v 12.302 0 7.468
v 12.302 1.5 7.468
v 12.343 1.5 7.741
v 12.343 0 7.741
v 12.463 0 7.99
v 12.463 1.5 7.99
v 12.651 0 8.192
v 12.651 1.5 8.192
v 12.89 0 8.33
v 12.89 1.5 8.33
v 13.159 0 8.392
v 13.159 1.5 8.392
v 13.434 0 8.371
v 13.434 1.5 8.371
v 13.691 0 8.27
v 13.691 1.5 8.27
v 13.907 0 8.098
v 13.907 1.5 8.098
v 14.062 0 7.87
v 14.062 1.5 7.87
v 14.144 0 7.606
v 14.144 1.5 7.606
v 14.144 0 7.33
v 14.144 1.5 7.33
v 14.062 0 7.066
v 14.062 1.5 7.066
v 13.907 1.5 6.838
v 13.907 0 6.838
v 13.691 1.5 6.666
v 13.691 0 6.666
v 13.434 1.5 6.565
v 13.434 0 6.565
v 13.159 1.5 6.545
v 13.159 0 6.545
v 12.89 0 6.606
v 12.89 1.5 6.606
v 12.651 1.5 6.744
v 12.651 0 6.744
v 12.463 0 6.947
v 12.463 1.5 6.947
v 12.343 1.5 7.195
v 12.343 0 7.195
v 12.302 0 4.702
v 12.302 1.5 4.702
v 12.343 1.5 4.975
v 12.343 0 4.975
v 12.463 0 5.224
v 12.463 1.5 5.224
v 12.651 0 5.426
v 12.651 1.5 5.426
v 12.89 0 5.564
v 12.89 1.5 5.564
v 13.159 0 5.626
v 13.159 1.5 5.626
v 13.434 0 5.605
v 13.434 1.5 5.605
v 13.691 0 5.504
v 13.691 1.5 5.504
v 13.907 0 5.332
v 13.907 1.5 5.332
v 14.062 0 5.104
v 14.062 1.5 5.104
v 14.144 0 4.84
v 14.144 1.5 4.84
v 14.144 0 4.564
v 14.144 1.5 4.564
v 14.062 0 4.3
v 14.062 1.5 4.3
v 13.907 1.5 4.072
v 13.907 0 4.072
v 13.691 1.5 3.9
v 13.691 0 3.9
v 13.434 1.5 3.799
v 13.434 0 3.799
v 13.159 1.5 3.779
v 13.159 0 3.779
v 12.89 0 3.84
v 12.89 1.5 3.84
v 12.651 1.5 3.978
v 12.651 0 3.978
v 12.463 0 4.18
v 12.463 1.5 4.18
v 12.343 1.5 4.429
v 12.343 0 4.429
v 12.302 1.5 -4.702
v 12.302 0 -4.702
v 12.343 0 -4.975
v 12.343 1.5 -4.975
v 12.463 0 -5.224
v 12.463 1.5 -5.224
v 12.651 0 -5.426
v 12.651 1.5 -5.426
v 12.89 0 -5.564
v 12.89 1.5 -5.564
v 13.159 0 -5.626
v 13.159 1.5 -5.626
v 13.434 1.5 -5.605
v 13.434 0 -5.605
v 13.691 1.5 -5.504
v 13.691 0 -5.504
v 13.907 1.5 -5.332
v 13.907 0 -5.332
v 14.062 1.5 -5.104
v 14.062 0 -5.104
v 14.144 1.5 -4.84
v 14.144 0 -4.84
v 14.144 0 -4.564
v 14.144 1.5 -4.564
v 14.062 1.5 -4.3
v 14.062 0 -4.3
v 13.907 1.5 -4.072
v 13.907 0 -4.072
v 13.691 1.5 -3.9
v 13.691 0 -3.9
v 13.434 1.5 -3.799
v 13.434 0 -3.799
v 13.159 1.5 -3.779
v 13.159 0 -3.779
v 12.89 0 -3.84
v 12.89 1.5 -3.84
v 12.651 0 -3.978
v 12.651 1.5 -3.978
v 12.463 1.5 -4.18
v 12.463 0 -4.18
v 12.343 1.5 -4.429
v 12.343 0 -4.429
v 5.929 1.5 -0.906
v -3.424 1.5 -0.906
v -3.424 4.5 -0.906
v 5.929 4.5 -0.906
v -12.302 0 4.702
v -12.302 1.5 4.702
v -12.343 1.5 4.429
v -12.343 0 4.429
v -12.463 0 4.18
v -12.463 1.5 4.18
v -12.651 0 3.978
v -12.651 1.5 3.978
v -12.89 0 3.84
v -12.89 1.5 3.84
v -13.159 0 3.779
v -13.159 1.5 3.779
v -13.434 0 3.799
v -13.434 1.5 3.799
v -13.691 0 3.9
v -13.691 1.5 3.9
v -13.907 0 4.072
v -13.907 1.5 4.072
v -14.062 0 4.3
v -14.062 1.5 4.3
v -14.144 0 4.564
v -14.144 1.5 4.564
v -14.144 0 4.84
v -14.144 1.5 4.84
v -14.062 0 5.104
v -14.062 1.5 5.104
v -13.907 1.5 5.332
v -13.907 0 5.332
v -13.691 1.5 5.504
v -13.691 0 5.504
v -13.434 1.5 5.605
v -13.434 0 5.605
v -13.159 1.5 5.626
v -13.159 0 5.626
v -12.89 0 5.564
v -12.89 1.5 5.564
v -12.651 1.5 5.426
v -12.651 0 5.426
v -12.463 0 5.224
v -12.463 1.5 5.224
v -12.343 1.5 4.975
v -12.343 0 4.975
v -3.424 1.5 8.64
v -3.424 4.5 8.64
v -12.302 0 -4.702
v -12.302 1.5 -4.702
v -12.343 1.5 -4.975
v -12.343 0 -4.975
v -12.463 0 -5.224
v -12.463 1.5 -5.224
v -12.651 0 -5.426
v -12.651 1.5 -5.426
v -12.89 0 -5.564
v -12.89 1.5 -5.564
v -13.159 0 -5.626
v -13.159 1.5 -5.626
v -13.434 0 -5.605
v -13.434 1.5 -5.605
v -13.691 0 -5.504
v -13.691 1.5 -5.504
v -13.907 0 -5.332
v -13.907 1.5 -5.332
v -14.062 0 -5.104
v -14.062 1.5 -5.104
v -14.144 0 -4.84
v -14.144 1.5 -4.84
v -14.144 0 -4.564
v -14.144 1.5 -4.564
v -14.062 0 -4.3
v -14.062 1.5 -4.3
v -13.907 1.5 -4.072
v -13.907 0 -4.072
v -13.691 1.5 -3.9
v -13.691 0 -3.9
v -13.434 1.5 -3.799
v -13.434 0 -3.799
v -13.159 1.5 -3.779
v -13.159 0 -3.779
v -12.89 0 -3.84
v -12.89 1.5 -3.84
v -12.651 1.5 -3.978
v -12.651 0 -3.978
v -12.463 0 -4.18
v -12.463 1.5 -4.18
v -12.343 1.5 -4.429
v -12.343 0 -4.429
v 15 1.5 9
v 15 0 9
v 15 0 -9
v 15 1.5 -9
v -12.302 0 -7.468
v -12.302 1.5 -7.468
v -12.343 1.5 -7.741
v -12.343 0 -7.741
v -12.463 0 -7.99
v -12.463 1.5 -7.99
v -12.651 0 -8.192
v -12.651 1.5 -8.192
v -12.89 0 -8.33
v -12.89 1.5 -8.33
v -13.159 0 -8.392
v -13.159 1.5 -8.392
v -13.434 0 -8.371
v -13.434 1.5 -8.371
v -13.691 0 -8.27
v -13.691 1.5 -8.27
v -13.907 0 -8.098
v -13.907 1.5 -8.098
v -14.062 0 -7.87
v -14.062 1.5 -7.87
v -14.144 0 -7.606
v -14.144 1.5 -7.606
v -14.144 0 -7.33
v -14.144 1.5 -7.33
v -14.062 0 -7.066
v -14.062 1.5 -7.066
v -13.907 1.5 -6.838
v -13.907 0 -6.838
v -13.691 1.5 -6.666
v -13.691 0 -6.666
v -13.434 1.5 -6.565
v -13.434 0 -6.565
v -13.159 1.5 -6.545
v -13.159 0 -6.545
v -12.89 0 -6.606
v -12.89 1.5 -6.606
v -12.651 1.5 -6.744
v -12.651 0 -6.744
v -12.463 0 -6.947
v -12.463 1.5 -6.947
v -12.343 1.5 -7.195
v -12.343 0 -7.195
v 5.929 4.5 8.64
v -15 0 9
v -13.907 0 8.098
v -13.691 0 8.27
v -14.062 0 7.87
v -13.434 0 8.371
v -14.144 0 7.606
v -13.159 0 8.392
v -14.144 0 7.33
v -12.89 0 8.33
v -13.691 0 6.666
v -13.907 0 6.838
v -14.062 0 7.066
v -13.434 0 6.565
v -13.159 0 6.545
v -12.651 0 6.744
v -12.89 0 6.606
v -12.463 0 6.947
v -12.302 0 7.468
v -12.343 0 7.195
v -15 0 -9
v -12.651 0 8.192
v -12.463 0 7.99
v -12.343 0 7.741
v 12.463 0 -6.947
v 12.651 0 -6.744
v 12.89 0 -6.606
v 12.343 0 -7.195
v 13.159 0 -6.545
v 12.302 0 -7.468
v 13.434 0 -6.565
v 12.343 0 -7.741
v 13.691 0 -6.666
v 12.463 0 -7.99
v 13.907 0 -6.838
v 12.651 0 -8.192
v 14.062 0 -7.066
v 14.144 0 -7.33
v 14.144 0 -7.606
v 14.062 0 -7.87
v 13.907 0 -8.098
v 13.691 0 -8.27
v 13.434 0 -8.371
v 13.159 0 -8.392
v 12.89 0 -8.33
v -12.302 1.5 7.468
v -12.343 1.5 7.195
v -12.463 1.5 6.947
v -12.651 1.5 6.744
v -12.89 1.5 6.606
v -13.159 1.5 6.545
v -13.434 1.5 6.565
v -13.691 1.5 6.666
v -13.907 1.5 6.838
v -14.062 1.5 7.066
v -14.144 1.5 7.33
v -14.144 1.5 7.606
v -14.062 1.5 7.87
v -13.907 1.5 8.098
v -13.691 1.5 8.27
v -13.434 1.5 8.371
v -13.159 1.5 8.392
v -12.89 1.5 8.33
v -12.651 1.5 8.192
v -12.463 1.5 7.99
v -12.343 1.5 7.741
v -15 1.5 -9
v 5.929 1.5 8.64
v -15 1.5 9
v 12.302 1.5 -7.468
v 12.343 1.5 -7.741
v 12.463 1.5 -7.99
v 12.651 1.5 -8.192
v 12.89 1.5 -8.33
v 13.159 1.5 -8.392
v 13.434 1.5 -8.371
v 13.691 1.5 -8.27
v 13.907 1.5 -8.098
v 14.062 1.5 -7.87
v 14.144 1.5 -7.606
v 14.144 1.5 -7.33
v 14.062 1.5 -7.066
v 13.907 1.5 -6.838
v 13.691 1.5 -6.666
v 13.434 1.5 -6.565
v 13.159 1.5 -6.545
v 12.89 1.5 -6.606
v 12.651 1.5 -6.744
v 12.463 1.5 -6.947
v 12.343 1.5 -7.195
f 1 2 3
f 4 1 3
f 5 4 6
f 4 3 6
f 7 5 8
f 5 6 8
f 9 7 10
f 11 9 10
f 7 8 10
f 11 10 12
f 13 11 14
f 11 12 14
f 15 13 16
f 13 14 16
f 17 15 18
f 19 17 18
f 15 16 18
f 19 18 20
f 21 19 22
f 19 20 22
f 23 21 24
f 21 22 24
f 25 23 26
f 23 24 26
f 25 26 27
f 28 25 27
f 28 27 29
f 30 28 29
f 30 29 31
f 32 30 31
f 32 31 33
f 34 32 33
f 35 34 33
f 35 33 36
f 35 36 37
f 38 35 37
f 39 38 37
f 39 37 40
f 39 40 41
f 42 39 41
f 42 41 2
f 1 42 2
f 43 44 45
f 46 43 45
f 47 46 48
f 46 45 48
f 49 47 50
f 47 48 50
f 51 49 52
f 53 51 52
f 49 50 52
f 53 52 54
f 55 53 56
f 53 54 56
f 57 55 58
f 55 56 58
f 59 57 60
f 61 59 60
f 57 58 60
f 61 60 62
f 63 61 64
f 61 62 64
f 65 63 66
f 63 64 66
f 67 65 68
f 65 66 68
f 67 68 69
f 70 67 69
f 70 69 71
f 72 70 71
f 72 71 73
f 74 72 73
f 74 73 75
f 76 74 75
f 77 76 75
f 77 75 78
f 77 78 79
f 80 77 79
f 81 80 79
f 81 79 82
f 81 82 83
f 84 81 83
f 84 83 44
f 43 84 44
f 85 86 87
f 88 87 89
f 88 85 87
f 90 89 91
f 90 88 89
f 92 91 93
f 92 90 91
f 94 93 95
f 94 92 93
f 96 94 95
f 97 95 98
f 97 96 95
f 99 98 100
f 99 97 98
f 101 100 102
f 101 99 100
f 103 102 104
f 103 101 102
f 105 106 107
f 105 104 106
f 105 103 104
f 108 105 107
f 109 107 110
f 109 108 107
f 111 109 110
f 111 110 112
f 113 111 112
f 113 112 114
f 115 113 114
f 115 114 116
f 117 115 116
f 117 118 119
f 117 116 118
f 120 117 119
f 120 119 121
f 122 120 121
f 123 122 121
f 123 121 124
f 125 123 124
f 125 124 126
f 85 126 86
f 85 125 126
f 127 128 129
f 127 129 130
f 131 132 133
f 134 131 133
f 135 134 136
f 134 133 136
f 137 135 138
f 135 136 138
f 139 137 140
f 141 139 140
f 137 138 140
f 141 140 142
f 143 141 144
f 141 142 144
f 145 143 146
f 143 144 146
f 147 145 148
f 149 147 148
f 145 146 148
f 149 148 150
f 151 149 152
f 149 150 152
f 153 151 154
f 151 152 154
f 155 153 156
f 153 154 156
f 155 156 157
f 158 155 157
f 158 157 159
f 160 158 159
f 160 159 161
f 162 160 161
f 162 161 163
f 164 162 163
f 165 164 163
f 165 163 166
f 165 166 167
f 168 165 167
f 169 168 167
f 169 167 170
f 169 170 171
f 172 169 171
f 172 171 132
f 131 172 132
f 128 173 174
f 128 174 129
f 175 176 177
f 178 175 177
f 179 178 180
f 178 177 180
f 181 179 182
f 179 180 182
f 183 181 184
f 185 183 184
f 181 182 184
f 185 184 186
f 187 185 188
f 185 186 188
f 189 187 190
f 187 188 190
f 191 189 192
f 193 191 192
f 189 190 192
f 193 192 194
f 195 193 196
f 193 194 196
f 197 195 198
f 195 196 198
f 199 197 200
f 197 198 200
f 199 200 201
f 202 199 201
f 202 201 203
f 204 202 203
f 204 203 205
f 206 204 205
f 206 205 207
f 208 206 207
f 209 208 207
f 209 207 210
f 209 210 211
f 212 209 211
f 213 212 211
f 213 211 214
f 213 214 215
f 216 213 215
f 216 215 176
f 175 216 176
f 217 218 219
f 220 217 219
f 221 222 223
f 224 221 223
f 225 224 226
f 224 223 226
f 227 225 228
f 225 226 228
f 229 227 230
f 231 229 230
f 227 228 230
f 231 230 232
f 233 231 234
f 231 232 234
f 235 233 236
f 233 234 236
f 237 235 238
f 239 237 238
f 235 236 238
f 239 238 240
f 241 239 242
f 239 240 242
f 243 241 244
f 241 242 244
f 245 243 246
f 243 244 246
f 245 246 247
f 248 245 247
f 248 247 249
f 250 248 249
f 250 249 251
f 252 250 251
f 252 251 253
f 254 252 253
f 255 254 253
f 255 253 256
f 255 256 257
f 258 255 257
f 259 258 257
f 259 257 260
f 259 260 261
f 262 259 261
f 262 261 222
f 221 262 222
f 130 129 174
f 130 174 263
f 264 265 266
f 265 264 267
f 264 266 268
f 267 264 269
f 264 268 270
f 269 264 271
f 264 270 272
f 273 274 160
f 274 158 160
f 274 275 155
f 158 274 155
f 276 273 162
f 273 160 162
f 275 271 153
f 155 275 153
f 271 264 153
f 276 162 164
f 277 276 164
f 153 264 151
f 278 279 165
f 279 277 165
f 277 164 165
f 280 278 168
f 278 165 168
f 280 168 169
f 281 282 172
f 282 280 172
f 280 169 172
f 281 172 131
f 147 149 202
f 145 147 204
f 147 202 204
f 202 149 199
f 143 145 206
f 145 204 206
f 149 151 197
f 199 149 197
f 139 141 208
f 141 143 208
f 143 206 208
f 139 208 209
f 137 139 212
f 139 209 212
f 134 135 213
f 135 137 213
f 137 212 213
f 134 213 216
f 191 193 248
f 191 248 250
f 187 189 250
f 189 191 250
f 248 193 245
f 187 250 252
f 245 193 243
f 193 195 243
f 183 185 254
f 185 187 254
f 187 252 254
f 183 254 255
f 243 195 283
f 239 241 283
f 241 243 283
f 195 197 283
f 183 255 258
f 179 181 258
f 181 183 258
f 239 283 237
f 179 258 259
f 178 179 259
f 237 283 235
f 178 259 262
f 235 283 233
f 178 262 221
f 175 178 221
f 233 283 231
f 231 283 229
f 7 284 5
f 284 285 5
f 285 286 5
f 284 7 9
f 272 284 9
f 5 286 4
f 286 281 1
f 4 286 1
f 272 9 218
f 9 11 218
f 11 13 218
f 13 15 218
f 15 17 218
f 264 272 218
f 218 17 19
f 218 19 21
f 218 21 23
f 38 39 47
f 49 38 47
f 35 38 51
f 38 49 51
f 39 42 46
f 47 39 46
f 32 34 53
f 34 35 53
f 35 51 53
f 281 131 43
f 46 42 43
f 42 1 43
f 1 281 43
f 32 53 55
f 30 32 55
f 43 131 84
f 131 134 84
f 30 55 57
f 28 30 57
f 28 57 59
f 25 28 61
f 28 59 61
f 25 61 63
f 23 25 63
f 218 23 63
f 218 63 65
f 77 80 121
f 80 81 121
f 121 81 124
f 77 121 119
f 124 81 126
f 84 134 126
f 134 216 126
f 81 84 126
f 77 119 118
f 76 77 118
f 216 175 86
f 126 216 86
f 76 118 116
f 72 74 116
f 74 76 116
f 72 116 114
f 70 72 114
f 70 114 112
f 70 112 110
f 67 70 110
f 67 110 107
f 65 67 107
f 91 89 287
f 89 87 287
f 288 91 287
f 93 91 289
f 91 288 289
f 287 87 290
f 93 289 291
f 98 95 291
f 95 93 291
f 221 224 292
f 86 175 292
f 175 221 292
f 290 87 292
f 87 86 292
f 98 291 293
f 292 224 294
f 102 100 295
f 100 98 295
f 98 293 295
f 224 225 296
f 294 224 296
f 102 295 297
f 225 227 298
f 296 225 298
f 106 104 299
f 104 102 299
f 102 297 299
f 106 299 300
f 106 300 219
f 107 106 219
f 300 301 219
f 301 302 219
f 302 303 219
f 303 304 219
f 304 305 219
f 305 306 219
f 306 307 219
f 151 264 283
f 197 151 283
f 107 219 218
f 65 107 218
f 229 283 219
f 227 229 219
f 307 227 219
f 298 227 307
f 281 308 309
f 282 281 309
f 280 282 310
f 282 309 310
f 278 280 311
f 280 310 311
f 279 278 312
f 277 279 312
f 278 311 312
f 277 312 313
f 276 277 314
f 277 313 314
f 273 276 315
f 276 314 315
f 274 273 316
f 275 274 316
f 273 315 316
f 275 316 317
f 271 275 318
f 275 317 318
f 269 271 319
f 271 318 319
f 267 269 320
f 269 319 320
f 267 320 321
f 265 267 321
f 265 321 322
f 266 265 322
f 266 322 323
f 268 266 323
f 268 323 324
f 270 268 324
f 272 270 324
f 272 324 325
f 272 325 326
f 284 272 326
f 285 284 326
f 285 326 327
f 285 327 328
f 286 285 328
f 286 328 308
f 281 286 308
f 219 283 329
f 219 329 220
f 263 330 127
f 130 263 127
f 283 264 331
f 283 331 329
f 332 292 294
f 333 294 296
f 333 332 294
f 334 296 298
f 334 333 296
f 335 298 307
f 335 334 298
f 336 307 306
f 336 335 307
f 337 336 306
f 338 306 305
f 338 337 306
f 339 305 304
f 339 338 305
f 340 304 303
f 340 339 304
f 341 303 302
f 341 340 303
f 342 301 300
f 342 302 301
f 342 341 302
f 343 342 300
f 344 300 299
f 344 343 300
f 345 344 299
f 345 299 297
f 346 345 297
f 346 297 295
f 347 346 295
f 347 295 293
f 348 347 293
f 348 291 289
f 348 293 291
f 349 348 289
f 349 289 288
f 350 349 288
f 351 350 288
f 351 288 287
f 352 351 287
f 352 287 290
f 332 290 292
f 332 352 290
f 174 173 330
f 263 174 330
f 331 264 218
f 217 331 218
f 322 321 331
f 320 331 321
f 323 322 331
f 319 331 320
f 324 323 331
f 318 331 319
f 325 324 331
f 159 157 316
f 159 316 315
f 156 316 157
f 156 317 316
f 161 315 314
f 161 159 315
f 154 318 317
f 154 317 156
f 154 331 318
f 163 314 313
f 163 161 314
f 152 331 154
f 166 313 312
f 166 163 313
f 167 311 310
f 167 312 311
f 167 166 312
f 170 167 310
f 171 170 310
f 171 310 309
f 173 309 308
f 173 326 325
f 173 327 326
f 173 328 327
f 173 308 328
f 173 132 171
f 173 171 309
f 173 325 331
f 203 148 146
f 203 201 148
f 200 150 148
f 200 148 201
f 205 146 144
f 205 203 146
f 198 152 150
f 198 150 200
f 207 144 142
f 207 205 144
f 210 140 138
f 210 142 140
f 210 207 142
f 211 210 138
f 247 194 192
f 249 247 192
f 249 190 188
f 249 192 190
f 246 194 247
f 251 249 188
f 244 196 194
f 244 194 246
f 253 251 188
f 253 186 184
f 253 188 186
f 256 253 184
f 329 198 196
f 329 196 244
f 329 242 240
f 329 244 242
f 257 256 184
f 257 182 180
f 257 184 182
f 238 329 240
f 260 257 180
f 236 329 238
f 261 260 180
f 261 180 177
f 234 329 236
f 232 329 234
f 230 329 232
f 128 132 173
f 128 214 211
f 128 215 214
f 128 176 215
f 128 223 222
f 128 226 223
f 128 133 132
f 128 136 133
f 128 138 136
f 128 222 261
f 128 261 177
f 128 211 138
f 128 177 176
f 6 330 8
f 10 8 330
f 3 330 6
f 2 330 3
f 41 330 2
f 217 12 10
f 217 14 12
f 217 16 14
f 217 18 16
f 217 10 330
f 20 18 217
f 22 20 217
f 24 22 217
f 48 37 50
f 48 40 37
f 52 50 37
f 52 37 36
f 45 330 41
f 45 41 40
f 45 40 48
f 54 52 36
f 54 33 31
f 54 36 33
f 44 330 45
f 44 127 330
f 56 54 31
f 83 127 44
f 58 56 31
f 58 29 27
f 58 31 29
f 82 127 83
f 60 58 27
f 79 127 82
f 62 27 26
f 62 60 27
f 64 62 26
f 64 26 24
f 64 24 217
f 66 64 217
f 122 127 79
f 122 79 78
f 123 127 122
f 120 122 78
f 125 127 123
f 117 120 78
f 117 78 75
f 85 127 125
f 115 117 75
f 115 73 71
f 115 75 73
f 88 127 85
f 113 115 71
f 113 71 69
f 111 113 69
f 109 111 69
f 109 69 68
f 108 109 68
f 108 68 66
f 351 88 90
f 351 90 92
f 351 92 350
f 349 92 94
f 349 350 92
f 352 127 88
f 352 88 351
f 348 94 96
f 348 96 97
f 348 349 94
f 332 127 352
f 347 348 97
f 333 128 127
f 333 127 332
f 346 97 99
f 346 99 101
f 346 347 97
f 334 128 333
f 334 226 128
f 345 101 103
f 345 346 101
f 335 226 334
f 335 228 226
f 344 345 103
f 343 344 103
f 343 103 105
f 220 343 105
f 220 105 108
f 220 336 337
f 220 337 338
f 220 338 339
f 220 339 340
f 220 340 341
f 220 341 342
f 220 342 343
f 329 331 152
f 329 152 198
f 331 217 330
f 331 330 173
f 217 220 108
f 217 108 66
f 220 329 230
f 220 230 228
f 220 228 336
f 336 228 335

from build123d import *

# Parameters (mm, degrees)
SKETCH1_W               = 30
SKETCH1_H               = 18
BOSS_EXTRUDE1_DEPTH     = 1.5
SKETCH2_W               = 9.352993505
SKETCH2_H               = 9.546694554
BOSS_EXTRUDE2_DEPTH     = 3
SKETCH3_R               = 0.926140641
CUT_EXTRUDE1_DEPTH      = 2.5
CIRPATTERN1_COUNT       = 2
MIRROR1_COPY_1_SKETCH_R = 0.926140641
MIRROR1_COPY_1_DEPTH    = 2.5


with BuildPart() as part:
    # Sketch1 → Boss-Extrude1 (new body)
    with BuildSketch(Plane(origin=(0, 0, 0), x_dir=(1, 0, 0), z_dir=(0, 1, 0))):
        Rectangle(SKETCH1_W, SKETCH1_H)
    extrude(amount=BOSS_EXTRUDE1_DEPTH)

    # Sketch2 → Boss-Extrude2 (add)
    with BuildSketch(Plane(origin=(0, 1.5, 0), x_dir=(1, 0, 0), z_dir=(0, 1, 0))):
        with Locations((1.252138924, -3.867103084)):
            Rectangle(SKETCH2_W, SKETCH2_H)
    extrude(amount=BOSS_EXTRUDE2_DEPTH)

    # Sketch3 → Cut-Extrude1 (cut, through all)
    with BuildSketch(Plane(origin=(0, 1.5, 0), x_dir=(1, 0, 0), z_dir=(0, 1, 0))):
        with Locations((-13.228024261, 7.468220339)):
            Circle(SKETCH3_R)
        with Locations((-13.228024261, 4.702212806)):
            Circle(SKETCH3_R)
    cut_extrude1 = extrude(amount=-CUT_EXTRUDE1_DEPTH, mode=Mode.SUBTRACT)

    # CirPattern1: Cut-Extrude1 ×2 about axis
    cirpattern1_axis = Axis((0, 0, 0), (0, 1, 0))
    for i in range(1, CIRPATTERN1_COUNT):
        add(cut_extrude1.rotate(cirpattern1_axis, i * 360 / CIRPATTERN1_COUNT), mode=Mode.SUBTRACT)

    # Mirror1: Cut-Extrude1 across plane
    add(cut_extrude1.mirror(Plane(origin=(0, 0, 0), x_dir=(0, 0, 1), z_dir=(1, 0, 0))), mode=Mode.SUBTRACT)

    # Mirror1 copy 1 sketch → Mirror1 copy 1 (cut, through all)
    with BuildSketch(Plane(origin=(0, 1.5, 0), x_dir=(1, 0, 0), z_dir=(0, 1, 0))):
        with Locations((-13.228024261, -7.468220339)):
            Circle(MIRROR1_COPY_1_SKETCH_R)
        with Locations((-13.228024261, -4.702212806)):
            Circle(MIRROR1_COPY_1_SKETCH_R)
    extrude(amount=-MIRROR1_COPY_1_DEPTH, mode=Mode.SUBTRACT)


solid = part.part
